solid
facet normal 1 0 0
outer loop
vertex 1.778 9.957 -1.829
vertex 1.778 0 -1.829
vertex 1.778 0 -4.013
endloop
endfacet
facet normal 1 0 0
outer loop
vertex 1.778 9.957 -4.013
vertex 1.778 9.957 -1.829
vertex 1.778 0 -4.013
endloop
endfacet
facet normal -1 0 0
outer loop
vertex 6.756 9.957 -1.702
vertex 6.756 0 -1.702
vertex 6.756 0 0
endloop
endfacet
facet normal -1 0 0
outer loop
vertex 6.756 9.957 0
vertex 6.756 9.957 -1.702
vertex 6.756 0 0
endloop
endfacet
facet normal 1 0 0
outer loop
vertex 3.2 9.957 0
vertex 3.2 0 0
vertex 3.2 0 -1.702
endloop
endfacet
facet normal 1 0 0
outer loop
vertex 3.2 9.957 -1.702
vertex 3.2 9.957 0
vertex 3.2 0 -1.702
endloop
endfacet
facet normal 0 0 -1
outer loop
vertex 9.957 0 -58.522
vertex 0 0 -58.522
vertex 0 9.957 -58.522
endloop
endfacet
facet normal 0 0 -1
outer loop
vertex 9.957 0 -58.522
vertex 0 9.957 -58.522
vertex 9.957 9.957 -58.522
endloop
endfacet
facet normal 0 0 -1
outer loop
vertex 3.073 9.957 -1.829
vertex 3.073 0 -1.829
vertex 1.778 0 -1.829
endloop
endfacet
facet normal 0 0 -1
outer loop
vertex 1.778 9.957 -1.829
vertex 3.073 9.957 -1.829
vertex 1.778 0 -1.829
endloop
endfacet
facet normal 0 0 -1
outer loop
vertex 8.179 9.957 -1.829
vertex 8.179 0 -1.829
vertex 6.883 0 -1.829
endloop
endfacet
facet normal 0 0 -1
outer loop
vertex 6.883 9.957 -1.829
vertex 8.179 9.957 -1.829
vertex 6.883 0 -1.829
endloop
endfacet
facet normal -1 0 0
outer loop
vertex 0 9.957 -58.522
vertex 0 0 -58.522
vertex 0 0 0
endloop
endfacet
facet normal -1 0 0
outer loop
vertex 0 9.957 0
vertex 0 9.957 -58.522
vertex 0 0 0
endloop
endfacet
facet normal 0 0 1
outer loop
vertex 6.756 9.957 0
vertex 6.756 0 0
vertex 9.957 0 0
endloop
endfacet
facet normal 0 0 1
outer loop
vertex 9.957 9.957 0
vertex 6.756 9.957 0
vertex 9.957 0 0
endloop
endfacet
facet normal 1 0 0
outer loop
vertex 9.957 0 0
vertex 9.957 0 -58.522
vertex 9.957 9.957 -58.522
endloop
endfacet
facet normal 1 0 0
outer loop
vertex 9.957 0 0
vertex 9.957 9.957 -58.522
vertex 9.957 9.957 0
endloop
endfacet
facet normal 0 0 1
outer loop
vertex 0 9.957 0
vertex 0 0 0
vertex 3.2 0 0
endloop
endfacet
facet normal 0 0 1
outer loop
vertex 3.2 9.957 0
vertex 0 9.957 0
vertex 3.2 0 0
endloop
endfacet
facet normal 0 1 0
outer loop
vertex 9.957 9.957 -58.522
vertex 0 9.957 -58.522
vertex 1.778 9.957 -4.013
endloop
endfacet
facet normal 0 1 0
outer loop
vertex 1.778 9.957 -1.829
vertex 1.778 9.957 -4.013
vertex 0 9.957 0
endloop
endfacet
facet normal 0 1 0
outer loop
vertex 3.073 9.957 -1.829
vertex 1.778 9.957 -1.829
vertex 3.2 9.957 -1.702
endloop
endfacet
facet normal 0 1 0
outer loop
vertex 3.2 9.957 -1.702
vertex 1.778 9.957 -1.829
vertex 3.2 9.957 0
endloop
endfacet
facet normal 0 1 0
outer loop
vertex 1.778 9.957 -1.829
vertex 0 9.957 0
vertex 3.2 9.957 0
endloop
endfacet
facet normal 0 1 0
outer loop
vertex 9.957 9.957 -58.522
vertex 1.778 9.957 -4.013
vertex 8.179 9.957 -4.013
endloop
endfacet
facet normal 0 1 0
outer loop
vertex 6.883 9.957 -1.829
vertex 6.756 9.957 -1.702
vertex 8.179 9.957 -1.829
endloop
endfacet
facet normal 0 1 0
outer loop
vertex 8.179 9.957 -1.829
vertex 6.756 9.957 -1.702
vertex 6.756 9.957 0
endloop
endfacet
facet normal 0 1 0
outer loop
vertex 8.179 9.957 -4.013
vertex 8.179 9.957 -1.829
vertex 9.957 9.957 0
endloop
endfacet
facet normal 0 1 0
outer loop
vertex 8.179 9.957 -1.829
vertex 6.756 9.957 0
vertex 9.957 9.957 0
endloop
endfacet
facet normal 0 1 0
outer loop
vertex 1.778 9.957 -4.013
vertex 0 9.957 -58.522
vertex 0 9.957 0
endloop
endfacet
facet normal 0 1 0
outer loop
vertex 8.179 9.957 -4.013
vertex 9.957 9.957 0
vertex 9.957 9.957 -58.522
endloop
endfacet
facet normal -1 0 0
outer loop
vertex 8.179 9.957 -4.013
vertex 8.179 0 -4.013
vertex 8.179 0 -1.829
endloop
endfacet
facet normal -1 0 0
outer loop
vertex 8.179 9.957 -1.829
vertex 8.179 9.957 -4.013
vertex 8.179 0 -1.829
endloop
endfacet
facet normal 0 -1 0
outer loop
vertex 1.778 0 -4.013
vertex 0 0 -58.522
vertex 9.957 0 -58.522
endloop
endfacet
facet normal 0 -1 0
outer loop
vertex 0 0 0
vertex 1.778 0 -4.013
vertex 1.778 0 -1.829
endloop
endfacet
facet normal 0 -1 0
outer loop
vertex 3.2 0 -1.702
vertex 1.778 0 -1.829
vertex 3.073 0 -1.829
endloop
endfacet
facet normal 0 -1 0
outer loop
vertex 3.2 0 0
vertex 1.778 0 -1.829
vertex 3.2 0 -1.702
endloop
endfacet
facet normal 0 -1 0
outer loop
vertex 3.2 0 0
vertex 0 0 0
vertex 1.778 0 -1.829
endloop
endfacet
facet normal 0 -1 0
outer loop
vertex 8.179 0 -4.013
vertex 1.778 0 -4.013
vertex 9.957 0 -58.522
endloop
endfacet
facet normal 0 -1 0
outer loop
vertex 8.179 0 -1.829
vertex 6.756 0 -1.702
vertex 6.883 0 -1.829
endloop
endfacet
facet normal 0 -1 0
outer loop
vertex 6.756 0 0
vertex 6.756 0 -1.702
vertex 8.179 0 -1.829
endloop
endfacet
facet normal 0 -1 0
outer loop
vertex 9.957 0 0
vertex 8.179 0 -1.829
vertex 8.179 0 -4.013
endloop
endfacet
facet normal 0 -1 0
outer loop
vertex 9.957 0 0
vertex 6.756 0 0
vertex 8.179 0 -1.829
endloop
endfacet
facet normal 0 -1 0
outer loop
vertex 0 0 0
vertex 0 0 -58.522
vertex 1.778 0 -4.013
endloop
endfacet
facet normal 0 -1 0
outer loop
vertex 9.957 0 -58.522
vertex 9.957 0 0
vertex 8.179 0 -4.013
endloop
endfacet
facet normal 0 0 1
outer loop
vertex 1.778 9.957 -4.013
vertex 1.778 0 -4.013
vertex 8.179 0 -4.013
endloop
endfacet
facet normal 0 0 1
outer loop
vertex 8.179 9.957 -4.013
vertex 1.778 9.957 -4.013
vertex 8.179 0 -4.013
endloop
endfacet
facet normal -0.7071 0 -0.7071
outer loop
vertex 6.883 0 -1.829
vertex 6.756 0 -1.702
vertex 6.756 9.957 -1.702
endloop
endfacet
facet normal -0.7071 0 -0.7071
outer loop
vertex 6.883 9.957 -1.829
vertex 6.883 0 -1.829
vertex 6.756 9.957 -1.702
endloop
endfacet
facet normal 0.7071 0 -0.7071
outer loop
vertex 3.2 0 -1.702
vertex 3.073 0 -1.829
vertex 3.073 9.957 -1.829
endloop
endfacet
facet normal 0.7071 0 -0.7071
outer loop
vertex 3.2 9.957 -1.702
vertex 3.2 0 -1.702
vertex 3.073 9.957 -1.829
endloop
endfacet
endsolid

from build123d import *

# Parameters (mm, degrees)
F0_W     = 9.9568
F0_H     = 58.5216
F1_DEPTH = 9.9568
F3_DEPTH = 9.9578
F4_SIZE  = 0.127


with BuildPart() as f1:
    # F0 (on Front) → F1 (new body)
    with BuildSketch(Plane.XZ):
        with Locations((4.9784, -29.2608)):
            Rectangle(F0_W, F0_H)
    extrude(amount=-F1_DEPTH)

    # F2 (on face) → F3 (cut, through all)
    with BuildSketch(Plane.XZ):
        Polygon((6.7564, 1.562734), (3.2004, 1.562903), (3.2004, -1.8288), (1.778, -1.8288), (1.778, -4.0132), (8.1788, -4.0132), (8.1788, -1.8288), (6.7564, -1.8288), align=None)
    extrude(amount=-F3_DEPTH, mode=Mode.SUBTRACT)

    # F4
    f4_edges = [f1.edges().sort_by_distance(p)[0] for p in [
        (3.2004, 4.9784, -1.8288),
        (6.7564, 4.9784, -1.8288),
    ]]
    chamfer(f4_edges, length=F4_SIZE)


solid = f1.part
